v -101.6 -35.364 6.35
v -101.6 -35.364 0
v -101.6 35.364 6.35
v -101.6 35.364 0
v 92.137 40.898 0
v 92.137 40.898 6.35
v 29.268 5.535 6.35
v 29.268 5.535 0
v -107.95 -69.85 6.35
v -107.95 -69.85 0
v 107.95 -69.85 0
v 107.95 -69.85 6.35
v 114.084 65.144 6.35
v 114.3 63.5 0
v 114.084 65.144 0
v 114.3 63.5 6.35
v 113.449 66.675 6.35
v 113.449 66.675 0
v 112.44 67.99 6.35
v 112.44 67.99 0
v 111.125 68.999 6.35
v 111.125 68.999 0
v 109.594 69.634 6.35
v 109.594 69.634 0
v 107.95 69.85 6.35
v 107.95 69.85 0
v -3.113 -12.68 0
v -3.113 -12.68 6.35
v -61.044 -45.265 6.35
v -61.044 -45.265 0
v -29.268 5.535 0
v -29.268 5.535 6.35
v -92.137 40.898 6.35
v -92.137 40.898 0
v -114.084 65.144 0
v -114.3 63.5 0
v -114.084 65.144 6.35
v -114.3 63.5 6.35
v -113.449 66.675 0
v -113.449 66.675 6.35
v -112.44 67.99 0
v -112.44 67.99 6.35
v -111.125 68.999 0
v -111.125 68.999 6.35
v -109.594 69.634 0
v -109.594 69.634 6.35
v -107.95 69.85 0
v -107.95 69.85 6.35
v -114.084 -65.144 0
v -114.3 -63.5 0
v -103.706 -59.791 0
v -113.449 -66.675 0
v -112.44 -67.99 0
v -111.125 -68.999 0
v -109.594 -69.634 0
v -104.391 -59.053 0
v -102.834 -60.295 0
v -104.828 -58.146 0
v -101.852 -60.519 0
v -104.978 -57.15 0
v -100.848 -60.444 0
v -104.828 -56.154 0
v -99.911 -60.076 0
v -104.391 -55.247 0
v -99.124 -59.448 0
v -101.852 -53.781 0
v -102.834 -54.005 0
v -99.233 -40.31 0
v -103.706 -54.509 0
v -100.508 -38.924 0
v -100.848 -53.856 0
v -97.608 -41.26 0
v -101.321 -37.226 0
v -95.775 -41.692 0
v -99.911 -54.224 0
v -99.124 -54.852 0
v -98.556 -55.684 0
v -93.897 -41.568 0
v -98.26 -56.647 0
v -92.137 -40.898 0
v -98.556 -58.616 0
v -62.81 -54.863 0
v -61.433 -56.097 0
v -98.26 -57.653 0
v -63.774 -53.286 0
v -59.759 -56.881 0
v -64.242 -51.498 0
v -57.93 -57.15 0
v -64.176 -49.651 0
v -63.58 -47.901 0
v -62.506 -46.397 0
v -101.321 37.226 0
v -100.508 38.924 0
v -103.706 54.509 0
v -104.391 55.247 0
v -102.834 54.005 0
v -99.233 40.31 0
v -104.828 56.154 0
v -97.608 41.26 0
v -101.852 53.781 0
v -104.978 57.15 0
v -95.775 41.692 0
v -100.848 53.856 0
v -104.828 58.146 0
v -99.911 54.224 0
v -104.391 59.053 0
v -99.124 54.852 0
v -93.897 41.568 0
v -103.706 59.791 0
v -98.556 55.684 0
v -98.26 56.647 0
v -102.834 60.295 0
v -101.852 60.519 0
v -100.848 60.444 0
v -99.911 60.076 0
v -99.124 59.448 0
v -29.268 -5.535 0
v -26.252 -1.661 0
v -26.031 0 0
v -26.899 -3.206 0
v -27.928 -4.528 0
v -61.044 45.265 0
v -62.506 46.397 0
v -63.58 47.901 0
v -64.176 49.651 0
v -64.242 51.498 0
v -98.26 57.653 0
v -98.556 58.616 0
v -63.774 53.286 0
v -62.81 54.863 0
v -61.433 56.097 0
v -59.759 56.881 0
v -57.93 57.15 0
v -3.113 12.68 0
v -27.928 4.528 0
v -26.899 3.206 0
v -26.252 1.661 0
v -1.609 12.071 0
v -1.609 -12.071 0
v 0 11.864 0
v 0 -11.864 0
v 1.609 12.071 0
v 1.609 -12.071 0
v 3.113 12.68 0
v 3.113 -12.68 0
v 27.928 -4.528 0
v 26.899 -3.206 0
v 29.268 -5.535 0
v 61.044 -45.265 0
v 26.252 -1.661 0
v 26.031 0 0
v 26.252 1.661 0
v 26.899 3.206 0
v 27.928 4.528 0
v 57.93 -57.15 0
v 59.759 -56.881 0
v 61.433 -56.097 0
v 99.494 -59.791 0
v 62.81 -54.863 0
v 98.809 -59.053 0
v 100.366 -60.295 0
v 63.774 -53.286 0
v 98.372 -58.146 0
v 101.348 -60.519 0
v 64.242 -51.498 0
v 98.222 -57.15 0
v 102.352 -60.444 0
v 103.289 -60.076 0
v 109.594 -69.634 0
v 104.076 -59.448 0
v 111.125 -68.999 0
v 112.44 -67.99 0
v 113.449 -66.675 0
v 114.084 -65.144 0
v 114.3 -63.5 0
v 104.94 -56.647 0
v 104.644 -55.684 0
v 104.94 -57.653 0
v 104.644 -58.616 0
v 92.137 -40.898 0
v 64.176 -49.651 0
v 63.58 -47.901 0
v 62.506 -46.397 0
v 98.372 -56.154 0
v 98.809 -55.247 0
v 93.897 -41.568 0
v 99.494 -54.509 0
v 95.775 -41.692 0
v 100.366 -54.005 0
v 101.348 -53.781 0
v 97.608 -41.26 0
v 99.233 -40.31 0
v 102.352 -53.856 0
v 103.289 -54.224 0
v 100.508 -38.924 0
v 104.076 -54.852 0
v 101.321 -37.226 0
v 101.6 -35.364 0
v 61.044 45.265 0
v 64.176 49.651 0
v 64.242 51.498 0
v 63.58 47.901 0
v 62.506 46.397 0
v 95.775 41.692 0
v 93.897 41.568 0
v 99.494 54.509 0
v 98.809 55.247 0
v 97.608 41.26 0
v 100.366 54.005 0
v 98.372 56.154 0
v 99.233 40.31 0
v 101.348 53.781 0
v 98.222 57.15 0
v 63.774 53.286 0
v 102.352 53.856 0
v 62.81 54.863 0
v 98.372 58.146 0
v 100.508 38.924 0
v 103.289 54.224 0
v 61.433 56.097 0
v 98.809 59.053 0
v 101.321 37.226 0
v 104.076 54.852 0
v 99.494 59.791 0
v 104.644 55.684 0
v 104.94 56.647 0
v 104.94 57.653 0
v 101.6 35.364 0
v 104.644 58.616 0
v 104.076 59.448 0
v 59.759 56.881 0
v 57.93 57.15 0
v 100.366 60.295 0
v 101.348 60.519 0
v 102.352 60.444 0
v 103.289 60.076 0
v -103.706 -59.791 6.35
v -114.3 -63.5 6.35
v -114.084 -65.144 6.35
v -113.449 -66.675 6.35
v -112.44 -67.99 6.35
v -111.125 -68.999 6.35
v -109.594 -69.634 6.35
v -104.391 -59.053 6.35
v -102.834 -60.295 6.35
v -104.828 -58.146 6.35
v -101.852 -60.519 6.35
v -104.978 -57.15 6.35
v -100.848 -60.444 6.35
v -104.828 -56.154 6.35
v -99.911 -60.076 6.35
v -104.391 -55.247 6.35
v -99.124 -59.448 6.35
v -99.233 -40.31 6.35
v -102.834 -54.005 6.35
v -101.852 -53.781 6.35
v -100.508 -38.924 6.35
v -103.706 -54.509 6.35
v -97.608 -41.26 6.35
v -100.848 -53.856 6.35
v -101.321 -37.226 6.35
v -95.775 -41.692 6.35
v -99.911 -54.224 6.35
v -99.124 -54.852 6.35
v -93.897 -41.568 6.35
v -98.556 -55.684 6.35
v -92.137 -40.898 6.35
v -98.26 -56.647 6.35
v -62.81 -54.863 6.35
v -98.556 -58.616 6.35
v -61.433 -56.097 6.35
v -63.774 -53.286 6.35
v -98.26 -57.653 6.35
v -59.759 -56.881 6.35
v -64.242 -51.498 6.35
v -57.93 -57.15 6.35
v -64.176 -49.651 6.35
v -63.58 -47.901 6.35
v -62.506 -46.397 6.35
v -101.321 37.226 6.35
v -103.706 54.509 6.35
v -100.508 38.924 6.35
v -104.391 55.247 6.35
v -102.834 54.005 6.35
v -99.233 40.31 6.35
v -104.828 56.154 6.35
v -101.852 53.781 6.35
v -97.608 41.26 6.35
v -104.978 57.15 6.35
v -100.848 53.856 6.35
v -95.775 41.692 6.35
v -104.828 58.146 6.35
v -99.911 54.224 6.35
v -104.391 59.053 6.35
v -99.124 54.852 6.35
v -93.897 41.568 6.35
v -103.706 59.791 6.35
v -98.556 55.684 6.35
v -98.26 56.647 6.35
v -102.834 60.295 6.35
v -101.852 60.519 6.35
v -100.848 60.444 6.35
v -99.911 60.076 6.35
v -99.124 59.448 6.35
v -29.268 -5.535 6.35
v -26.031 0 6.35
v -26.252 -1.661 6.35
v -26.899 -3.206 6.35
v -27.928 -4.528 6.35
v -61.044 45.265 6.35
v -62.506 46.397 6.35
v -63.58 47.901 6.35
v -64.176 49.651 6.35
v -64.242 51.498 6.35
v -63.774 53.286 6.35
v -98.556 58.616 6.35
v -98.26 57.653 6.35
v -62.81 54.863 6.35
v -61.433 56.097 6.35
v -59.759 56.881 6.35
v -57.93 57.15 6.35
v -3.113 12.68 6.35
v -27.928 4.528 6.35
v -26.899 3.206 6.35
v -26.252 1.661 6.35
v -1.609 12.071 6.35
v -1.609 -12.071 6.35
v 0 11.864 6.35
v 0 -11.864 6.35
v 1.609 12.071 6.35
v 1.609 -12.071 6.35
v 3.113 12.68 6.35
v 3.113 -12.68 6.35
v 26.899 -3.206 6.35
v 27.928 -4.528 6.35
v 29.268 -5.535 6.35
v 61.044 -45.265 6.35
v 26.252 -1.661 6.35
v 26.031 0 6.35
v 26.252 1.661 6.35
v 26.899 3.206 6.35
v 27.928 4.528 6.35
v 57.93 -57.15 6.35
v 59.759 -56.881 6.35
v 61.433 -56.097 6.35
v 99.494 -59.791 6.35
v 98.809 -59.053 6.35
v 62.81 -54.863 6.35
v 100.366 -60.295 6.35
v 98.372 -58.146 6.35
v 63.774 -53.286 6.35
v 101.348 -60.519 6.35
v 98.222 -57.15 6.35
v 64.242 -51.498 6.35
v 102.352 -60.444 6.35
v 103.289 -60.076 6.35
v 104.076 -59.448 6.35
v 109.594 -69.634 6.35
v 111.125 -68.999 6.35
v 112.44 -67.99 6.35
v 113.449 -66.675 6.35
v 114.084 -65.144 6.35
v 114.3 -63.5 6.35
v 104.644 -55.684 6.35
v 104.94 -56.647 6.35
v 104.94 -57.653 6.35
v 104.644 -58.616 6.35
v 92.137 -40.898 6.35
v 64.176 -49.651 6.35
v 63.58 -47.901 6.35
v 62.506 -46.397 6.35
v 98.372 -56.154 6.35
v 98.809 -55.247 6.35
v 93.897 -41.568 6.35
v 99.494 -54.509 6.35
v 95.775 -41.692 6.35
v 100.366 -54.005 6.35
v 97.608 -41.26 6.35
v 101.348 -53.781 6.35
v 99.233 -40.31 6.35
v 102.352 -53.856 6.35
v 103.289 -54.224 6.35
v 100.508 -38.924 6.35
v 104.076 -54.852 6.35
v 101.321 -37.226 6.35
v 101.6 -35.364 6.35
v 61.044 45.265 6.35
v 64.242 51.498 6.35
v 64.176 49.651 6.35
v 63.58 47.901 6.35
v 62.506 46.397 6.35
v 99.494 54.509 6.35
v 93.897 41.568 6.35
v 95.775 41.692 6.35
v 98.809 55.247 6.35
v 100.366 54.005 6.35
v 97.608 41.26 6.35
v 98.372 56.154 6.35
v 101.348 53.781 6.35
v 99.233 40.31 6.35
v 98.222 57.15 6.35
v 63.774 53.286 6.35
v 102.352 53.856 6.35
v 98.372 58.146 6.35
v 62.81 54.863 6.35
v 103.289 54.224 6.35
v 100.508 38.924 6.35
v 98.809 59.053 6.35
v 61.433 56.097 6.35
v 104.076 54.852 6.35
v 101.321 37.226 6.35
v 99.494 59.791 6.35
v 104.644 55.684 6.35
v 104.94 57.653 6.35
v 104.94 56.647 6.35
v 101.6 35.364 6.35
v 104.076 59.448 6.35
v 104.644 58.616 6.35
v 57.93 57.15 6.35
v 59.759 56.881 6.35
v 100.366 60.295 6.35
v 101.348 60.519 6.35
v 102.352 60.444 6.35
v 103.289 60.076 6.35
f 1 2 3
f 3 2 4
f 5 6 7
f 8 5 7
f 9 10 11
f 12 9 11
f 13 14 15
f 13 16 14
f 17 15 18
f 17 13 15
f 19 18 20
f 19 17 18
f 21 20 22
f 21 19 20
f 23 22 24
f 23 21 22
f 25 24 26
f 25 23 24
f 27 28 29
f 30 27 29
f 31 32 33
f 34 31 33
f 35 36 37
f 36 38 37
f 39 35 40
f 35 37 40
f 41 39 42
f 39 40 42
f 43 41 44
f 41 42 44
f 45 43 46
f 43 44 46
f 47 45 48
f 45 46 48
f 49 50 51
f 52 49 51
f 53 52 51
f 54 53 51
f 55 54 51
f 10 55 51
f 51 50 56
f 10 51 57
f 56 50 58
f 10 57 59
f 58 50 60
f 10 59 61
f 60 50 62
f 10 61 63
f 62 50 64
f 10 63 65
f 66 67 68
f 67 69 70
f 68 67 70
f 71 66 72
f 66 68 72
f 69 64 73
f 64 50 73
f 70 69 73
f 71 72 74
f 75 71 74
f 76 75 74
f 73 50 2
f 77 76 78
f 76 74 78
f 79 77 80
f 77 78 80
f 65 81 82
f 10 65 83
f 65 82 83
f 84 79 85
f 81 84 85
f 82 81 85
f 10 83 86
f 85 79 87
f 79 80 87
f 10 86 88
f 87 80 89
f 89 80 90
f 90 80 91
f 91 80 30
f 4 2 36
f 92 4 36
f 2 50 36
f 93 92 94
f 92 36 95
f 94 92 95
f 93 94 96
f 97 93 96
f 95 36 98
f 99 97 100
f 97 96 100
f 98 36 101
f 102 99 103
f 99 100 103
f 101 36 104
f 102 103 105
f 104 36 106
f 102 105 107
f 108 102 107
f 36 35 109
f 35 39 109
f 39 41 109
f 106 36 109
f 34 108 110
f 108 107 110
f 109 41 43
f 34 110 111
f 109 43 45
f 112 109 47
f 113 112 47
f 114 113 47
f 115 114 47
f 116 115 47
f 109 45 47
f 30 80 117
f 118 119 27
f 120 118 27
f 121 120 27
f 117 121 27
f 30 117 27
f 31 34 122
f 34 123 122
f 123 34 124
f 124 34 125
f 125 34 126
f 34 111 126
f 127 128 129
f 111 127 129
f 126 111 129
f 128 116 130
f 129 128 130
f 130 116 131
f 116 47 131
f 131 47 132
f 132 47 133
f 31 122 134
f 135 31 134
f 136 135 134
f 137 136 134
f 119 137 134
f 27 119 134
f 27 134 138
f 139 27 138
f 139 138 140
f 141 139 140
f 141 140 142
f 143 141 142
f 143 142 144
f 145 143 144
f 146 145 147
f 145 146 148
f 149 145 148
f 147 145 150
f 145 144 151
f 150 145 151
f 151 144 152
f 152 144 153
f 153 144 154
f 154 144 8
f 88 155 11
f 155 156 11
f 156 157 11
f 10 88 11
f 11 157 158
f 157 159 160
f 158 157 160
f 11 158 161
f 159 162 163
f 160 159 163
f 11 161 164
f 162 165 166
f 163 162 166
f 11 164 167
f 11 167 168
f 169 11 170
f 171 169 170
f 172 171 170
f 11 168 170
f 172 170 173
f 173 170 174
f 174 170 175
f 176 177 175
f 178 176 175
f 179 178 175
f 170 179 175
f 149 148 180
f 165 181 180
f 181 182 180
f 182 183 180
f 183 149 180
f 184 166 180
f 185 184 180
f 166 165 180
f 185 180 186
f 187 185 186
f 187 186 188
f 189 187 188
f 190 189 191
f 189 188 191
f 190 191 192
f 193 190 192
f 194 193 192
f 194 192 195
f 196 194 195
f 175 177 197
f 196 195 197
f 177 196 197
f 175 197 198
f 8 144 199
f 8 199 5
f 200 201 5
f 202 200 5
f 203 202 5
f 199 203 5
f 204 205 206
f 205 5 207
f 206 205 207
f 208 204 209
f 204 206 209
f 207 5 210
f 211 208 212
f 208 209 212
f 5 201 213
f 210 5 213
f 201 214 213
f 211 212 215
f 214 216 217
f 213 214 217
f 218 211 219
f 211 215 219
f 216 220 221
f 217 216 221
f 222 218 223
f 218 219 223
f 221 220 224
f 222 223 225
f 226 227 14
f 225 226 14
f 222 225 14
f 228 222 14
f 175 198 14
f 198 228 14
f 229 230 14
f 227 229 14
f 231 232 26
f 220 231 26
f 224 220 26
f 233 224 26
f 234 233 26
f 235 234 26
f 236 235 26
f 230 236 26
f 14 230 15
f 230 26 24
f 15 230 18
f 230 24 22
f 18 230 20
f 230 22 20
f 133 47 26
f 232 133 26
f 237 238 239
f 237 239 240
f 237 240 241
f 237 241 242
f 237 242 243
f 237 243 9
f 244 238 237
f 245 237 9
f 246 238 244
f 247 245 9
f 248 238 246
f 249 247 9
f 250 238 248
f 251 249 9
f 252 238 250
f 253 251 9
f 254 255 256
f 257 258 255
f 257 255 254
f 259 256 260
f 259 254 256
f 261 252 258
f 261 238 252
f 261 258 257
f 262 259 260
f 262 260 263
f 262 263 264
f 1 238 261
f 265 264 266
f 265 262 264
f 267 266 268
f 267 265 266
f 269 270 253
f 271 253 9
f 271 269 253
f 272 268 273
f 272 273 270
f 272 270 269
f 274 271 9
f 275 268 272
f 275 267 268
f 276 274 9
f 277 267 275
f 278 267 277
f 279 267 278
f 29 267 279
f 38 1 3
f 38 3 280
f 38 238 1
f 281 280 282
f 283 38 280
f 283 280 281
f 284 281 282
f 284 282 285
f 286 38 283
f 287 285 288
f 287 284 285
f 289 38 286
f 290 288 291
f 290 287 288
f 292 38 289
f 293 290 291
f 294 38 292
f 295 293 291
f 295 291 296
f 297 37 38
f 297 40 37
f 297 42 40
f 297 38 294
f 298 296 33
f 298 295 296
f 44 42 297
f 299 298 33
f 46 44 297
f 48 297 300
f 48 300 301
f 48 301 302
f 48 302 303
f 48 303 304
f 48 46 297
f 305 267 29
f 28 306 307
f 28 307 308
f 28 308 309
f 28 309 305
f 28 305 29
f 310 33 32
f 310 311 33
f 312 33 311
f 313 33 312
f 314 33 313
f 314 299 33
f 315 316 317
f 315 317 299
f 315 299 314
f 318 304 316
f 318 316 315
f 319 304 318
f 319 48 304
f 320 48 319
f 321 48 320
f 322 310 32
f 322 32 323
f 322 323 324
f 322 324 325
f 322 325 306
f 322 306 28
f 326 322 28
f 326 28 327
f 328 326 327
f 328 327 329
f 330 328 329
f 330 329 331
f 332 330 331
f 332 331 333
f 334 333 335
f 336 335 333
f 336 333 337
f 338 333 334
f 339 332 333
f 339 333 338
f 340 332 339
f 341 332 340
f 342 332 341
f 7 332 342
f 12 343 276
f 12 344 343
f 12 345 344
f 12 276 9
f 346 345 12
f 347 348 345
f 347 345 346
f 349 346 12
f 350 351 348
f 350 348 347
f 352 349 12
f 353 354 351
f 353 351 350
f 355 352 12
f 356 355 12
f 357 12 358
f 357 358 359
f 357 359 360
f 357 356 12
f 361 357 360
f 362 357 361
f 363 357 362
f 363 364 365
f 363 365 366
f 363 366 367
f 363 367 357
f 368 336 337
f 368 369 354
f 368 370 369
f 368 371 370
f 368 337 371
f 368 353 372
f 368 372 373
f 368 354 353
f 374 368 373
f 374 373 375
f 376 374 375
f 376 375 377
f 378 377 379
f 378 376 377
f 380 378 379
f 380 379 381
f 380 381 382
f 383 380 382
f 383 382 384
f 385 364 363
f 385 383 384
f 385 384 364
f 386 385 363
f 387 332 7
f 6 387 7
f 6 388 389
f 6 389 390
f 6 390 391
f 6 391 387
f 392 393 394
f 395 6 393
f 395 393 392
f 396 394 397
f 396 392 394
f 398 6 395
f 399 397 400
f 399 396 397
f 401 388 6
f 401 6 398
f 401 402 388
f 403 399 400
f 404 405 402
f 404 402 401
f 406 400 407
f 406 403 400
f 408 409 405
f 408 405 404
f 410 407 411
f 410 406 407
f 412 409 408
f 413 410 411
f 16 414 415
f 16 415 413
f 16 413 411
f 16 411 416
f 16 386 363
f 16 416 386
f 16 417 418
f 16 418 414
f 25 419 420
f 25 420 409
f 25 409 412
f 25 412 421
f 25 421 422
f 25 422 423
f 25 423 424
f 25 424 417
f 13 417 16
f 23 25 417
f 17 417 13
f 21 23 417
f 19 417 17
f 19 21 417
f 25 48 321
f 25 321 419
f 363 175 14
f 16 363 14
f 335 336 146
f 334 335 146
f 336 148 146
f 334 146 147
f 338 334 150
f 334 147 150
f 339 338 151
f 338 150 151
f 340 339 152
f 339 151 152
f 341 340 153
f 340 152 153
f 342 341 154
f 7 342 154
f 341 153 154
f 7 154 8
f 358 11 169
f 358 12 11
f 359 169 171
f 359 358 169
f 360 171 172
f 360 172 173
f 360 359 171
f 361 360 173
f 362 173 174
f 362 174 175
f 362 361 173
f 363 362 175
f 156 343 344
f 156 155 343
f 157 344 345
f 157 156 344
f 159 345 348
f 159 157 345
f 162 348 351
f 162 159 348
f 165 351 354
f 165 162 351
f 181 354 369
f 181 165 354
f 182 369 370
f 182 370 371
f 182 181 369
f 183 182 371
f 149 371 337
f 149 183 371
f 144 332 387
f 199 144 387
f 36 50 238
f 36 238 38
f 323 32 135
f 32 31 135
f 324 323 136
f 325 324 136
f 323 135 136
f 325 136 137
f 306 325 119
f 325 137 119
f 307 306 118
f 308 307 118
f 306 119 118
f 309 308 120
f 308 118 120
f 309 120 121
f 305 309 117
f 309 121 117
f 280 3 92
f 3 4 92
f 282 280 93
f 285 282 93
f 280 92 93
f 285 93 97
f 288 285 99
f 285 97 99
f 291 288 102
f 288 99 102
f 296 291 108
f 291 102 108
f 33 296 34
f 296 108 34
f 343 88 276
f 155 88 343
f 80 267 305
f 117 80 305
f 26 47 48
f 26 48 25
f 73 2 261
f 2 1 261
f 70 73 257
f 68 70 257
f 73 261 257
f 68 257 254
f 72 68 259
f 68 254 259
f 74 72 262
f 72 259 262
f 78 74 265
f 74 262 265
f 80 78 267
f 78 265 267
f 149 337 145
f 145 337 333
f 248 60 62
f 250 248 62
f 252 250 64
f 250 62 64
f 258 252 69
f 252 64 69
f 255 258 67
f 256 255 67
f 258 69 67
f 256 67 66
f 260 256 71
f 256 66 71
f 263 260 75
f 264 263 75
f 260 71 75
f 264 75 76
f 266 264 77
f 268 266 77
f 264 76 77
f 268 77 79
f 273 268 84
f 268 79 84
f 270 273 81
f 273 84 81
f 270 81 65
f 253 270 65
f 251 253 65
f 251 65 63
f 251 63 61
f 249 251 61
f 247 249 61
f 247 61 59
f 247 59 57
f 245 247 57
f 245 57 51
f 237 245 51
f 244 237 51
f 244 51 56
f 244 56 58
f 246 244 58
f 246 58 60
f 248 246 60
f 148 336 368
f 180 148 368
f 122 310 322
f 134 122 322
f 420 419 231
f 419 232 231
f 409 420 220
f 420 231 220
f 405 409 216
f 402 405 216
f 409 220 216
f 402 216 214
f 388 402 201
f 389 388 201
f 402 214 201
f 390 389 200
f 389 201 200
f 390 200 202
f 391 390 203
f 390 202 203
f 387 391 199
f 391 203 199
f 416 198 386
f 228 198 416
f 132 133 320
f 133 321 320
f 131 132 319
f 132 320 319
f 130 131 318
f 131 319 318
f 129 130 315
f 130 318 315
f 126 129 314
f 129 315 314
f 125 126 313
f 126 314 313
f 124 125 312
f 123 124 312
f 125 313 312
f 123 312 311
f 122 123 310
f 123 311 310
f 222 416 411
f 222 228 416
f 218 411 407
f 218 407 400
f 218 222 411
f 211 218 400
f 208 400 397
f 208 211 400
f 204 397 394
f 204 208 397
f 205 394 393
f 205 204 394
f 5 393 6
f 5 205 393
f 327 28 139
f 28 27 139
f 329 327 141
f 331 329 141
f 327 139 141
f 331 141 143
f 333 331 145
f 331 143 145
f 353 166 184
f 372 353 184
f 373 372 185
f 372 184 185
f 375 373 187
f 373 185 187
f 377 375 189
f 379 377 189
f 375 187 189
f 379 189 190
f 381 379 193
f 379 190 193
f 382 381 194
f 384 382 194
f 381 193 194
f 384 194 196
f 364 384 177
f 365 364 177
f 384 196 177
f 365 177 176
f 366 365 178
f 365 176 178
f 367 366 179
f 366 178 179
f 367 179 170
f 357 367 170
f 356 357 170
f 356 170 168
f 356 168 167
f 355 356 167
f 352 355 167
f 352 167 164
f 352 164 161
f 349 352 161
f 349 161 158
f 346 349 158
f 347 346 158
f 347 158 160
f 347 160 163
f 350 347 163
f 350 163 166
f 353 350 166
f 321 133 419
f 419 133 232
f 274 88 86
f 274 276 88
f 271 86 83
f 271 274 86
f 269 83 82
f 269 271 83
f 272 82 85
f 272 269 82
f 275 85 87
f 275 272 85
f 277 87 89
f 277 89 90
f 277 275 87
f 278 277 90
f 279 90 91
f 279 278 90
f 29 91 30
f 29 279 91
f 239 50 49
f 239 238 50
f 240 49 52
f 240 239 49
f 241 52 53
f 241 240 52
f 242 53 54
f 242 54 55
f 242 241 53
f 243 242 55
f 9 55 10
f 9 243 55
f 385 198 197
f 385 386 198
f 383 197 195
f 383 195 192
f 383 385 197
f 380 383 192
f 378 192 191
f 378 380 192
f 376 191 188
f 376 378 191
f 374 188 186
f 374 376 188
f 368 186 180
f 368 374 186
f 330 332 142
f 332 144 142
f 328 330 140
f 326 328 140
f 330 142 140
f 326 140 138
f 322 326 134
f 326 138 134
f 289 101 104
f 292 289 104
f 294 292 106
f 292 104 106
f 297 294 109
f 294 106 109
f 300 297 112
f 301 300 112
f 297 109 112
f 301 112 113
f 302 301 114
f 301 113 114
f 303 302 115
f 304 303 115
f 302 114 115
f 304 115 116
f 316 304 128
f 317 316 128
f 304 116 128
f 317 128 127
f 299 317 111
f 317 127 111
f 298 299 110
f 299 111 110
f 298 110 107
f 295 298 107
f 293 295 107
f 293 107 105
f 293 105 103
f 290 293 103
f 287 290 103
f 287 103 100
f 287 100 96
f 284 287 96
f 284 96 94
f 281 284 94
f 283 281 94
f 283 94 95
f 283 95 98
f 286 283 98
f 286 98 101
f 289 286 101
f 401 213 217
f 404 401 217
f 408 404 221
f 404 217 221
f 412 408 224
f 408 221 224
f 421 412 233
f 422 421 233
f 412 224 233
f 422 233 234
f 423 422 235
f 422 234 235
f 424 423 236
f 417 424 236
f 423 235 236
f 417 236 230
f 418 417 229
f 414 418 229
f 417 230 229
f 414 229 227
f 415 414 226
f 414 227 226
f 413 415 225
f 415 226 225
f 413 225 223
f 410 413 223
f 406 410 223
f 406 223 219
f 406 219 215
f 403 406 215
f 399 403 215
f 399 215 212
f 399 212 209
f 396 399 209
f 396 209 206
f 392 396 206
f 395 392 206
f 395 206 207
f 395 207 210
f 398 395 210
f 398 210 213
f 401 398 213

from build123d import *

# Parameters (mm, degrees)
SKETCH1_W                   = 228.6
SKETCH1_H                   = 139.7
SKETCH1_W_2                 = 203.2
SKETCH1_H_2                 = 114.3
BOSS_EXTRUDE1_DEPTH         = 6.35
BOSS_EXTRUDE2_DEPTH         = 6.35
FILLET1_R                   = 6.35
FILLET2_R                   = 6.35
F_1_4_CLEARANCE_HOLE1_D     = 6.7564
F_1_4_CLEARANCE_HOLE1_DEPTH = 9.906
F_1_4_CLEARANCE_HOLE1_TIP   = 2.029827343


with BuildPart() as part:
    # Sketch1 → Boss-Extrude1 (new body)
    with BuildSketch(Plane.XY):
        Rectangle(SKETCH1_W, SKETCH1_H)
        Rectangle(SKETCH1_W_2, SKETCH1_H_2, mode=Mode.SUBTRACT)
    extrude(amount=BOSS_EXTRUDE1_DEPTH)

    # Sketch2 → Boss-Extrude2 (add)
    with BuildSketch(Plane.XY.offset(6.35)):
        with BuildLine():
            Line((-96.930261692, 65.451756991), (0, 10.928484789))
            Line((0, 10.928484789), (96.930261692, 65.451756991))
            ThreePointArc((96.930261692, 65.451756991), (109.901756991, 61.819738308), (106.269738308, 48.848243009))
            Line((106.269738308, 48.848243009), (19.428417403, 0))
            Line((19.428417403, 0), (106.269738308, -48.848243009))
            ThreePointArc((106.269738308, -48.848243009), (109.901756991, -61.819738308), (96.930261692, -65.451756991))
            Line((96.930261692, -65.451756991), (0, -10.928484789))
            Line((0, -10.928484789), (-96.930261692, -65.451756991))
            ThreePointArc((-96.930261692, -65.451756991), (-109.901756991, -61.819738308), (-106.269738308, -48.848243009))
            Line((-106.269738308, -48.848243009), (-19.428417403, 0))
            Line((-19.428417403, 0), (-106.269738308, 48.848243009))
            ThreePointArc((-106.269738308, 48.848243009), (-109.901756991, 61.819738308), (-96.930261692, 65.451756991))
        make_face()
    extrude(amount=-BOSS_EXTRUDE2_DEPTH)

    # Fillet1
    fillet1_edges = [part.edges().sort_by_distance(p)[0] for p in [
        (82.171582597, 57.15, 3.175),
        (-82.171582597, 57.15, 3.175),
        (101.6, -46.221515211, 3.175),
        (101.6, 46.221515211, 3.175),
        (-82.171582597, -57.15, 3.175),
        (82.171582597, -57.15, 3.175),
        (-101.6, 46.221515211, 3.175),
        (-101.6, -46.221515211, 3.175),
        (0, 10.928484789, 3.175),
        (19.428417403, 0, 3.175),
        (0, -10.928484789, 3.175),
        (-19.428417403, 0, 3.175),
    ]]
    fillet(fillet1_edges, radius=FILLET1_R)

    # Fillet2
    fillet2_edges = [part.edges().sort_by_distance(p)[0] for p in [
        (114.3, -69.85, 3.175),
        (-114.3, -69.85, 3.175),
        (-114.3, 69.85, 3.175),
        (114.3, 69.85, 3.175),
    ]]
    fillet(fillet2_edges, radius=FILLET2_R)

    # 1/4 Clearance Hole1
    with Locations(Plane.XY.offset(6.35)):
        with Locations((-101.6, 57.15), (101.6, 57.15), (-101.6, -57.15), (101.6, -57.15)):
            Hole(F_1_4_CLEARANCE_HOLE1_D / 2, depth=F_1_4_CLEARANCE_HOLE1_DEPTH)
            with Locations((0, 0, -(F_1_4_CLEARANCE_HOLE1_DEPTH + F_1_4_CLEARANCE_HOLE1_TIP / 2))):  # 118° drill point
                Cone(0, F_1_4_CLEARANCE_HOLE1_D / 2, F_1_4_CLEARANCE_HOLE1_TIP, mode=Mode.SUBTRACT)


solid = part.part
